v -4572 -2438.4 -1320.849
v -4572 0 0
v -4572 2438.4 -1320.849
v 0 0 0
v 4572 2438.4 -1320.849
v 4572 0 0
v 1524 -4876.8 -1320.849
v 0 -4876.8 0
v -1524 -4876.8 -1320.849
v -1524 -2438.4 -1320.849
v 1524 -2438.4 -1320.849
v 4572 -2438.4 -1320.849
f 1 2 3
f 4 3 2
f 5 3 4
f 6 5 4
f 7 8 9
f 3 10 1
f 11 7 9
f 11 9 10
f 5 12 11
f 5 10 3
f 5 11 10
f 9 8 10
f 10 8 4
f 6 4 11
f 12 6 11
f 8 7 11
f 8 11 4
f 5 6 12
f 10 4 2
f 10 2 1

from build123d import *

# Parameters (mm, degrees)
F2_DEPTH = 4876.8
F3_DEPTH = 4572


with BuildPart() as f2:
    # F1 (on Front) → F2 (new body)
    with BuildSketch(Plane.XZ):
        Polygon((-1524, -1320.849362), (1524, -1320.849362), (0, 0), align=None)
    extrude(amount=F2_DEPTH)

    # F0 (on Right) → F3 (join, symmetric)
    with BuildSketch(Plane.YZ):
        Polygon((-2438.4, -1320.849362), (2438.4, -1320.849362), (0, 0), align=None)
    extrude(amount=F3_DEPTH, both=True)


solid = f2.part
